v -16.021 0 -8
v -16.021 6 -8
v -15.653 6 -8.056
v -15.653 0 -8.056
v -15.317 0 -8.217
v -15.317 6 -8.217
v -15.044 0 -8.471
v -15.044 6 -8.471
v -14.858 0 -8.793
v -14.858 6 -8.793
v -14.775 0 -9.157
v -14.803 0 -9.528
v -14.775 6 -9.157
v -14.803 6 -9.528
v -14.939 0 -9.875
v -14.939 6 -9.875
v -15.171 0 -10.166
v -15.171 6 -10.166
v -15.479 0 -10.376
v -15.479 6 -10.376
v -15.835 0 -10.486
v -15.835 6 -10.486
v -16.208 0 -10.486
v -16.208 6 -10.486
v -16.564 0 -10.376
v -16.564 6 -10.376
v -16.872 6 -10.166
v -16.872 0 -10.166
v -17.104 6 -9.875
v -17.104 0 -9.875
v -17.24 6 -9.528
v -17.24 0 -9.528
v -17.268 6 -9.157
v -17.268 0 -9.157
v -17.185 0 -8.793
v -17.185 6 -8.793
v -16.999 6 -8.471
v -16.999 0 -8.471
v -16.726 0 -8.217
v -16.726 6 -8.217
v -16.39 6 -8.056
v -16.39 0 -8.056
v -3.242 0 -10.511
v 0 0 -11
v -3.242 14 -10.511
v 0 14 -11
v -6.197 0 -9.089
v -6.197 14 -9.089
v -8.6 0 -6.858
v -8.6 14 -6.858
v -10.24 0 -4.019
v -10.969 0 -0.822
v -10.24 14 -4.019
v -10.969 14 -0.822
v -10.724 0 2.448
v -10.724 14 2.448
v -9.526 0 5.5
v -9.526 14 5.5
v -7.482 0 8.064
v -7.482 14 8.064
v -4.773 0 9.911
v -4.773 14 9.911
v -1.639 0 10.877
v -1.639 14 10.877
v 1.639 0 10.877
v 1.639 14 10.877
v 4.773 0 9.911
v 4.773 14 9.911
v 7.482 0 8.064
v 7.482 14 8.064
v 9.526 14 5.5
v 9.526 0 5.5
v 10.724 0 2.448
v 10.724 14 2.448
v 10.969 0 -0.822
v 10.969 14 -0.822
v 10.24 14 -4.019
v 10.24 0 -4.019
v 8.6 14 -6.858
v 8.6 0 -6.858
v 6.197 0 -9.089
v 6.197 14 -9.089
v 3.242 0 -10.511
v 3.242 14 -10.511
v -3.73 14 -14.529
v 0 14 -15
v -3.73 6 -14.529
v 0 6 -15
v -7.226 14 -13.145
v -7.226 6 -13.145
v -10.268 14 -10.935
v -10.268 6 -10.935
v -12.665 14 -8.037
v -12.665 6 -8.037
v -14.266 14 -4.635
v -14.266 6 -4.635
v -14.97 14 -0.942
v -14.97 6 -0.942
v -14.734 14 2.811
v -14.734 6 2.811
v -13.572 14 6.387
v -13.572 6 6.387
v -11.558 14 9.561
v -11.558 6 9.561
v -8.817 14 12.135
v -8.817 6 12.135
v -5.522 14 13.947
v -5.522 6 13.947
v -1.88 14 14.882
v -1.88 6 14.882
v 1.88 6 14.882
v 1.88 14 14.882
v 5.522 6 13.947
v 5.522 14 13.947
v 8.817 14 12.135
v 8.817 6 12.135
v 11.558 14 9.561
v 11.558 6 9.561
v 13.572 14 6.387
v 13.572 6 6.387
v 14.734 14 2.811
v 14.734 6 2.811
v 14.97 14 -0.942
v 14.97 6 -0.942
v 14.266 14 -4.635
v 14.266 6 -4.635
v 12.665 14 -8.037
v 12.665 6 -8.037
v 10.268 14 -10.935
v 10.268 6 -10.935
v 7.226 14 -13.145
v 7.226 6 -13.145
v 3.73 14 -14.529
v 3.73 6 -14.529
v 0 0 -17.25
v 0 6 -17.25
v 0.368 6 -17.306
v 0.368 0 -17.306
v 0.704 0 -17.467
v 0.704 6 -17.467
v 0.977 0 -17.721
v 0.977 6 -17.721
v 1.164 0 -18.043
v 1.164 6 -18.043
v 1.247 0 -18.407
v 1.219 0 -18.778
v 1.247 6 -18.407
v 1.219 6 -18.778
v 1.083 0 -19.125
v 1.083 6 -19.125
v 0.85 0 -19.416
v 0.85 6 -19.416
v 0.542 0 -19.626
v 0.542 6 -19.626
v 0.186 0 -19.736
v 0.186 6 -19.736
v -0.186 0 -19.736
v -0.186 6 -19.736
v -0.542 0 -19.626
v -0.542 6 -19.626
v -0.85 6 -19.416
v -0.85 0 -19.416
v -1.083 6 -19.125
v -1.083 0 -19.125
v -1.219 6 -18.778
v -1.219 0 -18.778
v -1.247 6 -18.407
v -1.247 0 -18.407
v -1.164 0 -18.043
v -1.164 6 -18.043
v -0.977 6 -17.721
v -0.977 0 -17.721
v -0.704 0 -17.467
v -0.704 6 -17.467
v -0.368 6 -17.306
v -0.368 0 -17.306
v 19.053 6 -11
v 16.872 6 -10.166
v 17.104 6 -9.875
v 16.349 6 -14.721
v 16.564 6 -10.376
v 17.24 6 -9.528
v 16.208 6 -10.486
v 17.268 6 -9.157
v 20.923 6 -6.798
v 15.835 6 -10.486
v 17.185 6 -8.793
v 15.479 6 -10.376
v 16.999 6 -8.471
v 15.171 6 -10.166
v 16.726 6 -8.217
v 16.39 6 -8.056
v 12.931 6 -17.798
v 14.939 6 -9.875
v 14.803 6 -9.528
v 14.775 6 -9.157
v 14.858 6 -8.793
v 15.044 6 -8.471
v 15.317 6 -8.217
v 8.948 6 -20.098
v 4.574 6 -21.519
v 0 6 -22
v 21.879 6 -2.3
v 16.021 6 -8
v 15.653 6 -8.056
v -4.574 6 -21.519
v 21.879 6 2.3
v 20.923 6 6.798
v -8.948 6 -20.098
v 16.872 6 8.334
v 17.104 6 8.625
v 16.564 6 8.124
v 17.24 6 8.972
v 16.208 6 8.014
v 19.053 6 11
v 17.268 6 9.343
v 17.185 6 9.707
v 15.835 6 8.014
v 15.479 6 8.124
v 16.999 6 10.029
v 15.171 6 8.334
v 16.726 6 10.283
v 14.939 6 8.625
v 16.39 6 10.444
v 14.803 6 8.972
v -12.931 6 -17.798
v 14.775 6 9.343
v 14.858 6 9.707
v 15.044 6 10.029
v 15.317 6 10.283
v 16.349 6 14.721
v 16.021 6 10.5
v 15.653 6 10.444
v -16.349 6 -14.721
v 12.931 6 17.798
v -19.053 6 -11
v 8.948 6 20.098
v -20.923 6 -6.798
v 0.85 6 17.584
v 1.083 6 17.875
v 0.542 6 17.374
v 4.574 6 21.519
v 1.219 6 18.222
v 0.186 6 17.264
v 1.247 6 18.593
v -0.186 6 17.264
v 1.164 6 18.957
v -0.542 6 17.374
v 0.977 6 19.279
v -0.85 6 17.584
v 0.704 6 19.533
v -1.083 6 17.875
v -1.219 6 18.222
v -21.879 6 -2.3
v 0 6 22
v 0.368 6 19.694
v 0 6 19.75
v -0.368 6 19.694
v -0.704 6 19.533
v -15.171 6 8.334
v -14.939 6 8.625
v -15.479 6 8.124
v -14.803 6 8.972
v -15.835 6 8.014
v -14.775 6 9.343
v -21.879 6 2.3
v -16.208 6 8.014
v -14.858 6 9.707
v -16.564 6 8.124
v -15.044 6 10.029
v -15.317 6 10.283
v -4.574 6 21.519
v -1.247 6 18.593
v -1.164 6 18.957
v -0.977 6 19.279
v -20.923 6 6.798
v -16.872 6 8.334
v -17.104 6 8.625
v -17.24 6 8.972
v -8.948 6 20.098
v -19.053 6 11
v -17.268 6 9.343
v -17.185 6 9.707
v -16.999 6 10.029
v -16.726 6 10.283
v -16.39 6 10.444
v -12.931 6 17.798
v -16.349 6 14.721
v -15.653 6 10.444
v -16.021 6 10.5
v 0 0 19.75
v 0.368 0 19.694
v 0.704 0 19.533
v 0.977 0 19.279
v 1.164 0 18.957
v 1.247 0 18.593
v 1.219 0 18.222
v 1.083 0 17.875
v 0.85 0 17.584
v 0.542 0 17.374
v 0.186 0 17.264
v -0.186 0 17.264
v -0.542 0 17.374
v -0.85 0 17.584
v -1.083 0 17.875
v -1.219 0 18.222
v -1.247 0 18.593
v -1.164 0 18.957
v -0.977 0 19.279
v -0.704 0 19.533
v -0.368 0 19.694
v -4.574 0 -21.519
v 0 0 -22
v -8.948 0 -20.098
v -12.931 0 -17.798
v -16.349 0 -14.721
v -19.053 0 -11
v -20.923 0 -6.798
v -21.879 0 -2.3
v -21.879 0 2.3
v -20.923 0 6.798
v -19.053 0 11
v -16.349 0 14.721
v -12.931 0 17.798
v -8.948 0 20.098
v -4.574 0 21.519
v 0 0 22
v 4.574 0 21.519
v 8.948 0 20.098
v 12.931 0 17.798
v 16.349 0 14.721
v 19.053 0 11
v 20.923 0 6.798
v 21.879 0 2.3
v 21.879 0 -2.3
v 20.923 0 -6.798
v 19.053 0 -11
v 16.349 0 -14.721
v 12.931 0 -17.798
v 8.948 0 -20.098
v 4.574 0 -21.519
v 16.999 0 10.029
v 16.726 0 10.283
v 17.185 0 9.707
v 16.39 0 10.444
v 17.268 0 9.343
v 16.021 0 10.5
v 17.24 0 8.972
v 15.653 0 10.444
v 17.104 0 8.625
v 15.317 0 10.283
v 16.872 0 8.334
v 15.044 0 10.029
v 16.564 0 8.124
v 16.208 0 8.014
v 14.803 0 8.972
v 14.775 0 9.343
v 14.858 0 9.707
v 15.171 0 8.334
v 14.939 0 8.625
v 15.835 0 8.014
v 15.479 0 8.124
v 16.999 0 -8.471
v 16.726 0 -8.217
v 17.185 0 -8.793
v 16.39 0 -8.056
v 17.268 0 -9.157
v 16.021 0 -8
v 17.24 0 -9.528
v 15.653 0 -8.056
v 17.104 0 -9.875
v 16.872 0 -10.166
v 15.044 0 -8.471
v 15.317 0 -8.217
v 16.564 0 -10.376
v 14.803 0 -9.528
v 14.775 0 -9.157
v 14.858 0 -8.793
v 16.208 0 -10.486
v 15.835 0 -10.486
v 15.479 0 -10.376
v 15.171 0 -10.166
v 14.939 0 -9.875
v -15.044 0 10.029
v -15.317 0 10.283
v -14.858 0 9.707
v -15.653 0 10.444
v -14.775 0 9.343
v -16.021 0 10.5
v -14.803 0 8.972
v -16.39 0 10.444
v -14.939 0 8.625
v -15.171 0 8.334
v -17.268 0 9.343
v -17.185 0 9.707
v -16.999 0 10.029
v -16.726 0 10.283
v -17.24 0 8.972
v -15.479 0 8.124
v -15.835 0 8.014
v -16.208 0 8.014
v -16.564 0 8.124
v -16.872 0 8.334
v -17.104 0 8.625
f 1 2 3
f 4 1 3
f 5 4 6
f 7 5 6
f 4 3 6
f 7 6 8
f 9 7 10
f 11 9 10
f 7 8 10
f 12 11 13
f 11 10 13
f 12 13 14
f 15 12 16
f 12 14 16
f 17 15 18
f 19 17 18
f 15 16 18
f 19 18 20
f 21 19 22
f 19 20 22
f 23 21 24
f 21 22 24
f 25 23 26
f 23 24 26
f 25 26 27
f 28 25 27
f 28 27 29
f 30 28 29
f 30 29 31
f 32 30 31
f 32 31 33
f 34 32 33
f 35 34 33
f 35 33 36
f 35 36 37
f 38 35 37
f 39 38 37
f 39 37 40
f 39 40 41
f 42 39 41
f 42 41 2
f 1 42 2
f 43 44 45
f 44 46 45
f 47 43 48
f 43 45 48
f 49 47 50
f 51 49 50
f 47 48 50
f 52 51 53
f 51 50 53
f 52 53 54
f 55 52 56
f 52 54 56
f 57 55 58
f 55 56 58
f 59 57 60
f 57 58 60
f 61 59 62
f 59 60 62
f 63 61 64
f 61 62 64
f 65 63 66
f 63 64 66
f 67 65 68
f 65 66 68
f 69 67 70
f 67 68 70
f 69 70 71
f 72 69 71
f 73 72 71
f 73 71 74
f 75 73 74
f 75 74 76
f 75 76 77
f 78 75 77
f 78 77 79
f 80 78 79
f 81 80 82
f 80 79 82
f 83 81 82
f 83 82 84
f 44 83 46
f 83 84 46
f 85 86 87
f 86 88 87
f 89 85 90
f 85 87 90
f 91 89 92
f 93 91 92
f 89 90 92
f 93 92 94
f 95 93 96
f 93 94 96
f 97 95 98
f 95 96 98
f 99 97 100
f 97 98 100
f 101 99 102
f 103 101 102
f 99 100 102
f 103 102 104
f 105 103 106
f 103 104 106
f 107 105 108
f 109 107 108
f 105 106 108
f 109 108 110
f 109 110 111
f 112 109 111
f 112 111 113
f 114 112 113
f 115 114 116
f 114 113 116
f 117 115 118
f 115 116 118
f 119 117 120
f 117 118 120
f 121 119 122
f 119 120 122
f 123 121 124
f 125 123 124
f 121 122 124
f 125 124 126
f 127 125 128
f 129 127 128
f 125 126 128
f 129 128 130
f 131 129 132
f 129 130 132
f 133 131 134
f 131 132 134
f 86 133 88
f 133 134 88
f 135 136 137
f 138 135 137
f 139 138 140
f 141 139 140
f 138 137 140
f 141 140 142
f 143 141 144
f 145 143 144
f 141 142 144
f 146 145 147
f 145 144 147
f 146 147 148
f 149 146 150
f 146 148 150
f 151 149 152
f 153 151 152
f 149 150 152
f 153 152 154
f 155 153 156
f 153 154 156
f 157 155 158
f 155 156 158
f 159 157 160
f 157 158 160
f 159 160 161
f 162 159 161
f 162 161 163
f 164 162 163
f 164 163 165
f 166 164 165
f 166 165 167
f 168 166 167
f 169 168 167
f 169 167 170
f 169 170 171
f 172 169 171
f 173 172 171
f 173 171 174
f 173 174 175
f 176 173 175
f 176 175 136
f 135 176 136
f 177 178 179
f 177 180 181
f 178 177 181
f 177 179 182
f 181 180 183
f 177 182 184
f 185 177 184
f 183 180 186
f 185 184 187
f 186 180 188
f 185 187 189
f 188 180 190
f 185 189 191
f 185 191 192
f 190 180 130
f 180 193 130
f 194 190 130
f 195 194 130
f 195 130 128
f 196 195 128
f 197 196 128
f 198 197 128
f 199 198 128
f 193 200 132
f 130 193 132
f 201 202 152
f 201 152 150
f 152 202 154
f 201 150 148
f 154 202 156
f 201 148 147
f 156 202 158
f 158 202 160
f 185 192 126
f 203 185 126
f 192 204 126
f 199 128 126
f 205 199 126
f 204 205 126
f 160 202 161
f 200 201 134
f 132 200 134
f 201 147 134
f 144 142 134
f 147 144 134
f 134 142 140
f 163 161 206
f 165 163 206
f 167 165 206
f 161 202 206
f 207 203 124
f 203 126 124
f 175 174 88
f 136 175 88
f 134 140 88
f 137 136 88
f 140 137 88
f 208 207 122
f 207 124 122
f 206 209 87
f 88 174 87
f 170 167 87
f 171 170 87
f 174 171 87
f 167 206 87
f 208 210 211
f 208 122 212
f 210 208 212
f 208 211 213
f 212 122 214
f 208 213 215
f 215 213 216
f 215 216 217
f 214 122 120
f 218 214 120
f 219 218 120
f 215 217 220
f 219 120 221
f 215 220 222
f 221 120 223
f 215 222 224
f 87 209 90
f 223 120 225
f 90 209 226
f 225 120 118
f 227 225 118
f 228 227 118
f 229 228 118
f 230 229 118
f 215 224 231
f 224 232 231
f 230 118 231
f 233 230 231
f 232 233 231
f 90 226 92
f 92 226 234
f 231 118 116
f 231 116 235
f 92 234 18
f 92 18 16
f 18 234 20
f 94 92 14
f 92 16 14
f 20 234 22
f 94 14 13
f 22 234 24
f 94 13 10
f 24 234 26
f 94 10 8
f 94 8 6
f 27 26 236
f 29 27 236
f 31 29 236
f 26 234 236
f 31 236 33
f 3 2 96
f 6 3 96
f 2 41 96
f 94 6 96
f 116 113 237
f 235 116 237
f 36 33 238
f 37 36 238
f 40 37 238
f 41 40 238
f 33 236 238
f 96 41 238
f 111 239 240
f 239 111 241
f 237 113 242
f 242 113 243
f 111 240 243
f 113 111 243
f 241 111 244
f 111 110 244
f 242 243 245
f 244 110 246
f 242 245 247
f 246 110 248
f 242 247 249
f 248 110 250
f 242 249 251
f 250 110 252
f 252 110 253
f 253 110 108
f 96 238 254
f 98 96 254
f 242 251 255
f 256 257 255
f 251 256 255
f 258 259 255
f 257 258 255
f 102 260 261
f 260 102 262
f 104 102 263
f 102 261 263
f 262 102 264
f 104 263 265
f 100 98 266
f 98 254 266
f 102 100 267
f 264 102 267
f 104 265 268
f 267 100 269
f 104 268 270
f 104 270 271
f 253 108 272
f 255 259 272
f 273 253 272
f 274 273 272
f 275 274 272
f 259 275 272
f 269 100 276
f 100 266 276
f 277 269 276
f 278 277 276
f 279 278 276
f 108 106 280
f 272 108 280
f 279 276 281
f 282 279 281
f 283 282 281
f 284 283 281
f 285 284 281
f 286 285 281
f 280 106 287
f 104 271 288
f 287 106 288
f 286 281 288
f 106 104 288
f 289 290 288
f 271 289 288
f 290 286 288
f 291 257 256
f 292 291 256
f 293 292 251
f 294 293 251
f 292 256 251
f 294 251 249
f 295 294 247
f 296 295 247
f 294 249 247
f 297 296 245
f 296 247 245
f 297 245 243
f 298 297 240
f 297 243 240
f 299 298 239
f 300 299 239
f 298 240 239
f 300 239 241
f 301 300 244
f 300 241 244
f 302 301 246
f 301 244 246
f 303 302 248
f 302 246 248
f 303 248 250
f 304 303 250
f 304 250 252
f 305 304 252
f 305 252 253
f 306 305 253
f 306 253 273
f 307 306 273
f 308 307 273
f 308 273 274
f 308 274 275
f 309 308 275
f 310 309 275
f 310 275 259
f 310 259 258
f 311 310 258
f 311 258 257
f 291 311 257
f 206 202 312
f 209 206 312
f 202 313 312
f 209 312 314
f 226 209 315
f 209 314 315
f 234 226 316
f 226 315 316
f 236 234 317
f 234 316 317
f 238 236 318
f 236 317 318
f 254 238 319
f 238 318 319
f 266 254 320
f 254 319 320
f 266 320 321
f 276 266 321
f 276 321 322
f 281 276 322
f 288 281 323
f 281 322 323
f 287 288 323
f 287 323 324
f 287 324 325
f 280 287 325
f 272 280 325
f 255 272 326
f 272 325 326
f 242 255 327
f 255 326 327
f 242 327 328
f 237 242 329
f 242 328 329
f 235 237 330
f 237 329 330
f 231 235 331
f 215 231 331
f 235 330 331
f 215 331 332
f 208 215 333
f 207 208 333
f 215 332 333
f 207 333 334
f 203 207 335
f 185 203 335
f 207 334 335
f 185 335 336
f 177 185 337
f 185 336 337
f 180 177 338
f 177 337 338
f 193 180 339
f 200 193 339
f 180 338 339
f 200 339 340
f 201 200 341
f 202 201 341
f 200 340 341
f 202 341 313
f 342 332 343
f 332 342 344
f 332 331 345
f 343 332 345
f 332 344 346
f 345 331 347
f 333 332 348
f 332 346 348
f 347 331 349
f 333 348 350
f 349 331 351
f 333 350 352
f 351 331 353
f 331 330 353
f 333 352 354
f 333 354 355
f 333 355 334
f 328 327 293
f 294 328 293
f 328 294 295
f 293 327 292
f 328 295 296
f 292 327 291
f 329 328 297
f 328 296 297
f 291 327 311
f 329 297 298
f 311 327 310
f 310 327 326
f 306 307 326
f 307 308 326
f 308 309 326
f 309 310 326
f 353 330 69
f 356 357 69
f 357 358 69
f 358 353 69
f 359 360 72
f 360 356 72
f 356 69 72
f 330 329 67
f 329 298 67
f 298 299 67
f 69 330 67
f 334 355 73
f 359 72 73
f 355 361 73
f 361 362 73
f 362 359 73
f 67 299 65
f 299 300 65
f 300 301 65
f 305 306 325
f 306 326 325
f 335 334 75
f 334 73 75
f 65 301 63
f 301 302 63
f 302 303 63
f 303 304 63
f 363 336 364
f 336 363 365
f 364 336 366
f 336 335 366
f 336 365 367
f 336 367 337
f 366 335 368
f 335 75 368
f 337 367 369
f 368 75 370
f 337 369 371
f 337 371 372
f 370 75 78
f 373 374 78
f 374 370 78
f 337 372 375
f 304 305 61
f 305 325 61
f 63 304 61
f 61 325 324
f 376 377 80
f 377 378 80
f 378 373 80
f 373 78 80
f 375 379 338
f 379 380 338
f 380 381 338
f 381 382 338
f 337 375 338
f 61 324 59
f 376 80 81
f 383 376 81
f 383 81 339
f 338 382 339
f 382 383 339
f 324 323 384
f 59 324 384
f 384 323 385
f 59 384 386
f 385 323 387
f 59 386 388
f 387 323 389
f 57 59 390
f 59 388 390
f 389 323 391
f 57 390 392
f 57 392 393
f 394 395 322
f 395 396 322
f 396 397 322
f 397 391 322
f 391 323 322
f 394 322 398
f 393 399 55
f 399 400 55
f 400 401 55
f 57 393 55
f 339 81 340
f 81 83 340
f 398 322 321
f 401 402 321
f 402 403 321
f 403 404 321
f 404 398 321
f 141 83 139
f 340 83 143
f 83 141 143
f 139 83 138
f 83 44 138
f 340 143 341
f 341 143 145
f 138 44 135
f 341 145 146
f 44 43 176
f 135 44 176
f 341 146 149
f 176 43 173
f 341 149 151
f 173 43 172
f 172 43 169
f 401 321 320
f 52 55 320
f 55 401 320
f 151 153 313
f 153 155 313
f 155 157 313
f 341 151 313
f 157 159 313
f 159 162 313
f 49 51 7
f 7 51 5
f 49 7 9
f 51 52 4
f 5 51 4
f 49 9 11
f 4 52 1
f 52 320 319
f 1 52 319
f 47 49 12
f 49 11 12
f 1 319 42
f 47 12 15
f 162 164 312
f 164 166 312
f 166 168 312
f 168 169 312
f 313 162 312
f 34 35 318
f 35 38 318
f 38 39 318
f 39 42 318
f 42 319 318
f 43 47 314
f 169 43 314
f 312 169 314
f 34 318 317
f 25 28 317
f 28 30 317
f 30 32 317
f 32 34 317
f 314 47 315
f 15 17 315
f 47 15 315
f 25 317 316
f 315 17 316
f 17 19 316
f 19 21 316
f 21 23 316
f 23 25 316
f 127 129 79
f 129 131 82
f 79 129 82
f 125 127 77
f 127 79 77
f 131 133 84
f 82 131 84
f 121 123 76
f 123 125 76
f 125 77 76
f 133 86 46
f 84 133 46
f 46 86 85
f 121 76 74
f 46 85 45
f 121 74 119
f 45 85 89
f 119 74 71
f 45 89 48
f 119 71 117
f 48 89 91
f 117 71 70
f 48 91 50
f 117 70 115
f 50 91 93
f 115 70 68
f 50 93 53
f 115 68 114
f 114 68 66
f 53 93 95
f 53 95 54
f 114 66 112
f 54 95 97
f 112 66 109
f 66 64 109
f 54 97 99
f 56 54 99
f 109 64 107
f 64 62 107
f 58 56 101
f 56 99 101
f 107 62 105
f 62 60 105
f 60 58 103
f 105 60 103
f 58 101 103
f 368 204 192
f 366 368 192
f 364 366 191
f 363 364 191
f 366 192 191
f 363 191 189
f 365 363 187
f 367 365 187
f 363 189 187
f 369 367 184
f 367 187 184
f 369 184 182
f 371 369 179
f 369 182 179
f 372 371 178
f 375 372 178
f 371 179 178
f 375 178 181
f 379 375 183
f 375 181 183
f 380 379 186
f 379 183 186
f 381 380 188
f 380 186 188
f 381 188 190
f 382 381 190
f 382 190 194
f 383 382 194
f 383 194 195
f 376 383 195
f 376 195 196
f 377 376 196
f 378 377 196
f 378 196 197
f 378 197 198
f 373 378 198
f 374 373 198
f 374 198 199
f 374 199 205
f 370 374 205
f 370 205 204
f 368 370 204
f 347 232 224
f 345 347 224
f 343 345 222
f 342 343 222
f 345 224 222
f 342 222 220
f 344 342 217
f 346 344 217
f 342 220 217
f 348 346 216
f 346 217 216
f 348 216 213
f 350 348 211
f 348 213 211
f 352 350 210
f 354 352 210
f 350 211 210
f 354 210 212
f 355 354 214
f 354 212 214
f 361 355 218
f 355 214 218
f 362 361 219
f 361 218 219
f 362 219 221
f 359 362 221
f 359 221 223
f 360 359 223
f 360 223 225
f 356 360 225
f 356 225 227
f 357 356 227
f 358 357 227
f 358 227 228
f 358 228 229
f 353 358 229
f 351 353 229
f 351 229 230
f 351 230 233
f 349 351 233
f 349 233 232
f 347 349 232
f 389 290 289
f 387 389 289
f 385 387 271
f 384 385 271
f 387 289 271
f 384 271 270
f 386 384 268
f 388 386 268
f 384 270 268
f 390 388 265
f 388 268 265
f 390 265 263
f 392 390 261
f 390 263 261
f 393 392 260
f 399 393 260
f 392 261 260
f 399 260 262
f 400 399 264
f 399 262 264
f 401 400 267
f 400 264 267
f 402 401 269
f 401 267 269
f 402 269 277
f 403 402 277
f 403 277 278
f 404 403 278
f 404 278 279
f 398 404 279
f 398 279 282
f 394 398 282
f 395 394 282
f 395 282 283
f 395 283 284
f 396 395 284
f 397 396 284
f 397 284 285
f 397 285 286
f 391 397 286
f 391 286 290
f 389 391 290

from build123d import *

# Parameters (mm, degrees)
SKETCH2_R          = 1.25
CUT_EXTRUDE1_DEPTH = 10


with BuildPart() as part:
    # Sketch1 → Revolve1 (revolve)
    with BuildSketch(Plane.XY, mode=Mode.PRIVATE) as revolve1_sk:
        Polygon((11, 0), (11, 14), (15, 14), (15, 6), (22, 6), (22, 0), align=None)
    revolve(revolve1_sk.sketch.rotate(Axis((0, 0, 0), (0, 1, 0)), 90), axis=Axis((0, 0, 0), (0, 1, 0)))

    # Sketch2 → Cut-Extrude1 (cut)
    with BuildSketch(Plane(origin=(0, 6, 0), x_dir=(1, 0, 0), z_dir=(0, 1, 0))):
        with Locations(Location((0, 18.5, 0), (0, 0, 270))):
            Circle(SKETCH2_R)
        with Locations(Location((16.02146997, 9.25, 0), (0, 0, 270))):
            Circle(SKETCH2_R)
        with Locations(Location((16.02146997, -9.25, 0), (0, 0, 270))):
            Circle(SKETCH2_R)
        with Locations(Location((0, -18.5, 0), (0, 0, 270))):
            Circle(SKETCH2_R)
        with Locations(Location((-16.02146997, -9.25, 0), (0, 0, 270))):
            Circle(SKETCH2_R)
        with Locations(Location((-16.02146997, 9.25, 0), (0, 0, 270))):
            Circle(SKETCH2_R)
    extrude(amount=-CUT_EXTRUDE1_DEPTH, mode=Mode.SUBTRACT)


solid = part.part
